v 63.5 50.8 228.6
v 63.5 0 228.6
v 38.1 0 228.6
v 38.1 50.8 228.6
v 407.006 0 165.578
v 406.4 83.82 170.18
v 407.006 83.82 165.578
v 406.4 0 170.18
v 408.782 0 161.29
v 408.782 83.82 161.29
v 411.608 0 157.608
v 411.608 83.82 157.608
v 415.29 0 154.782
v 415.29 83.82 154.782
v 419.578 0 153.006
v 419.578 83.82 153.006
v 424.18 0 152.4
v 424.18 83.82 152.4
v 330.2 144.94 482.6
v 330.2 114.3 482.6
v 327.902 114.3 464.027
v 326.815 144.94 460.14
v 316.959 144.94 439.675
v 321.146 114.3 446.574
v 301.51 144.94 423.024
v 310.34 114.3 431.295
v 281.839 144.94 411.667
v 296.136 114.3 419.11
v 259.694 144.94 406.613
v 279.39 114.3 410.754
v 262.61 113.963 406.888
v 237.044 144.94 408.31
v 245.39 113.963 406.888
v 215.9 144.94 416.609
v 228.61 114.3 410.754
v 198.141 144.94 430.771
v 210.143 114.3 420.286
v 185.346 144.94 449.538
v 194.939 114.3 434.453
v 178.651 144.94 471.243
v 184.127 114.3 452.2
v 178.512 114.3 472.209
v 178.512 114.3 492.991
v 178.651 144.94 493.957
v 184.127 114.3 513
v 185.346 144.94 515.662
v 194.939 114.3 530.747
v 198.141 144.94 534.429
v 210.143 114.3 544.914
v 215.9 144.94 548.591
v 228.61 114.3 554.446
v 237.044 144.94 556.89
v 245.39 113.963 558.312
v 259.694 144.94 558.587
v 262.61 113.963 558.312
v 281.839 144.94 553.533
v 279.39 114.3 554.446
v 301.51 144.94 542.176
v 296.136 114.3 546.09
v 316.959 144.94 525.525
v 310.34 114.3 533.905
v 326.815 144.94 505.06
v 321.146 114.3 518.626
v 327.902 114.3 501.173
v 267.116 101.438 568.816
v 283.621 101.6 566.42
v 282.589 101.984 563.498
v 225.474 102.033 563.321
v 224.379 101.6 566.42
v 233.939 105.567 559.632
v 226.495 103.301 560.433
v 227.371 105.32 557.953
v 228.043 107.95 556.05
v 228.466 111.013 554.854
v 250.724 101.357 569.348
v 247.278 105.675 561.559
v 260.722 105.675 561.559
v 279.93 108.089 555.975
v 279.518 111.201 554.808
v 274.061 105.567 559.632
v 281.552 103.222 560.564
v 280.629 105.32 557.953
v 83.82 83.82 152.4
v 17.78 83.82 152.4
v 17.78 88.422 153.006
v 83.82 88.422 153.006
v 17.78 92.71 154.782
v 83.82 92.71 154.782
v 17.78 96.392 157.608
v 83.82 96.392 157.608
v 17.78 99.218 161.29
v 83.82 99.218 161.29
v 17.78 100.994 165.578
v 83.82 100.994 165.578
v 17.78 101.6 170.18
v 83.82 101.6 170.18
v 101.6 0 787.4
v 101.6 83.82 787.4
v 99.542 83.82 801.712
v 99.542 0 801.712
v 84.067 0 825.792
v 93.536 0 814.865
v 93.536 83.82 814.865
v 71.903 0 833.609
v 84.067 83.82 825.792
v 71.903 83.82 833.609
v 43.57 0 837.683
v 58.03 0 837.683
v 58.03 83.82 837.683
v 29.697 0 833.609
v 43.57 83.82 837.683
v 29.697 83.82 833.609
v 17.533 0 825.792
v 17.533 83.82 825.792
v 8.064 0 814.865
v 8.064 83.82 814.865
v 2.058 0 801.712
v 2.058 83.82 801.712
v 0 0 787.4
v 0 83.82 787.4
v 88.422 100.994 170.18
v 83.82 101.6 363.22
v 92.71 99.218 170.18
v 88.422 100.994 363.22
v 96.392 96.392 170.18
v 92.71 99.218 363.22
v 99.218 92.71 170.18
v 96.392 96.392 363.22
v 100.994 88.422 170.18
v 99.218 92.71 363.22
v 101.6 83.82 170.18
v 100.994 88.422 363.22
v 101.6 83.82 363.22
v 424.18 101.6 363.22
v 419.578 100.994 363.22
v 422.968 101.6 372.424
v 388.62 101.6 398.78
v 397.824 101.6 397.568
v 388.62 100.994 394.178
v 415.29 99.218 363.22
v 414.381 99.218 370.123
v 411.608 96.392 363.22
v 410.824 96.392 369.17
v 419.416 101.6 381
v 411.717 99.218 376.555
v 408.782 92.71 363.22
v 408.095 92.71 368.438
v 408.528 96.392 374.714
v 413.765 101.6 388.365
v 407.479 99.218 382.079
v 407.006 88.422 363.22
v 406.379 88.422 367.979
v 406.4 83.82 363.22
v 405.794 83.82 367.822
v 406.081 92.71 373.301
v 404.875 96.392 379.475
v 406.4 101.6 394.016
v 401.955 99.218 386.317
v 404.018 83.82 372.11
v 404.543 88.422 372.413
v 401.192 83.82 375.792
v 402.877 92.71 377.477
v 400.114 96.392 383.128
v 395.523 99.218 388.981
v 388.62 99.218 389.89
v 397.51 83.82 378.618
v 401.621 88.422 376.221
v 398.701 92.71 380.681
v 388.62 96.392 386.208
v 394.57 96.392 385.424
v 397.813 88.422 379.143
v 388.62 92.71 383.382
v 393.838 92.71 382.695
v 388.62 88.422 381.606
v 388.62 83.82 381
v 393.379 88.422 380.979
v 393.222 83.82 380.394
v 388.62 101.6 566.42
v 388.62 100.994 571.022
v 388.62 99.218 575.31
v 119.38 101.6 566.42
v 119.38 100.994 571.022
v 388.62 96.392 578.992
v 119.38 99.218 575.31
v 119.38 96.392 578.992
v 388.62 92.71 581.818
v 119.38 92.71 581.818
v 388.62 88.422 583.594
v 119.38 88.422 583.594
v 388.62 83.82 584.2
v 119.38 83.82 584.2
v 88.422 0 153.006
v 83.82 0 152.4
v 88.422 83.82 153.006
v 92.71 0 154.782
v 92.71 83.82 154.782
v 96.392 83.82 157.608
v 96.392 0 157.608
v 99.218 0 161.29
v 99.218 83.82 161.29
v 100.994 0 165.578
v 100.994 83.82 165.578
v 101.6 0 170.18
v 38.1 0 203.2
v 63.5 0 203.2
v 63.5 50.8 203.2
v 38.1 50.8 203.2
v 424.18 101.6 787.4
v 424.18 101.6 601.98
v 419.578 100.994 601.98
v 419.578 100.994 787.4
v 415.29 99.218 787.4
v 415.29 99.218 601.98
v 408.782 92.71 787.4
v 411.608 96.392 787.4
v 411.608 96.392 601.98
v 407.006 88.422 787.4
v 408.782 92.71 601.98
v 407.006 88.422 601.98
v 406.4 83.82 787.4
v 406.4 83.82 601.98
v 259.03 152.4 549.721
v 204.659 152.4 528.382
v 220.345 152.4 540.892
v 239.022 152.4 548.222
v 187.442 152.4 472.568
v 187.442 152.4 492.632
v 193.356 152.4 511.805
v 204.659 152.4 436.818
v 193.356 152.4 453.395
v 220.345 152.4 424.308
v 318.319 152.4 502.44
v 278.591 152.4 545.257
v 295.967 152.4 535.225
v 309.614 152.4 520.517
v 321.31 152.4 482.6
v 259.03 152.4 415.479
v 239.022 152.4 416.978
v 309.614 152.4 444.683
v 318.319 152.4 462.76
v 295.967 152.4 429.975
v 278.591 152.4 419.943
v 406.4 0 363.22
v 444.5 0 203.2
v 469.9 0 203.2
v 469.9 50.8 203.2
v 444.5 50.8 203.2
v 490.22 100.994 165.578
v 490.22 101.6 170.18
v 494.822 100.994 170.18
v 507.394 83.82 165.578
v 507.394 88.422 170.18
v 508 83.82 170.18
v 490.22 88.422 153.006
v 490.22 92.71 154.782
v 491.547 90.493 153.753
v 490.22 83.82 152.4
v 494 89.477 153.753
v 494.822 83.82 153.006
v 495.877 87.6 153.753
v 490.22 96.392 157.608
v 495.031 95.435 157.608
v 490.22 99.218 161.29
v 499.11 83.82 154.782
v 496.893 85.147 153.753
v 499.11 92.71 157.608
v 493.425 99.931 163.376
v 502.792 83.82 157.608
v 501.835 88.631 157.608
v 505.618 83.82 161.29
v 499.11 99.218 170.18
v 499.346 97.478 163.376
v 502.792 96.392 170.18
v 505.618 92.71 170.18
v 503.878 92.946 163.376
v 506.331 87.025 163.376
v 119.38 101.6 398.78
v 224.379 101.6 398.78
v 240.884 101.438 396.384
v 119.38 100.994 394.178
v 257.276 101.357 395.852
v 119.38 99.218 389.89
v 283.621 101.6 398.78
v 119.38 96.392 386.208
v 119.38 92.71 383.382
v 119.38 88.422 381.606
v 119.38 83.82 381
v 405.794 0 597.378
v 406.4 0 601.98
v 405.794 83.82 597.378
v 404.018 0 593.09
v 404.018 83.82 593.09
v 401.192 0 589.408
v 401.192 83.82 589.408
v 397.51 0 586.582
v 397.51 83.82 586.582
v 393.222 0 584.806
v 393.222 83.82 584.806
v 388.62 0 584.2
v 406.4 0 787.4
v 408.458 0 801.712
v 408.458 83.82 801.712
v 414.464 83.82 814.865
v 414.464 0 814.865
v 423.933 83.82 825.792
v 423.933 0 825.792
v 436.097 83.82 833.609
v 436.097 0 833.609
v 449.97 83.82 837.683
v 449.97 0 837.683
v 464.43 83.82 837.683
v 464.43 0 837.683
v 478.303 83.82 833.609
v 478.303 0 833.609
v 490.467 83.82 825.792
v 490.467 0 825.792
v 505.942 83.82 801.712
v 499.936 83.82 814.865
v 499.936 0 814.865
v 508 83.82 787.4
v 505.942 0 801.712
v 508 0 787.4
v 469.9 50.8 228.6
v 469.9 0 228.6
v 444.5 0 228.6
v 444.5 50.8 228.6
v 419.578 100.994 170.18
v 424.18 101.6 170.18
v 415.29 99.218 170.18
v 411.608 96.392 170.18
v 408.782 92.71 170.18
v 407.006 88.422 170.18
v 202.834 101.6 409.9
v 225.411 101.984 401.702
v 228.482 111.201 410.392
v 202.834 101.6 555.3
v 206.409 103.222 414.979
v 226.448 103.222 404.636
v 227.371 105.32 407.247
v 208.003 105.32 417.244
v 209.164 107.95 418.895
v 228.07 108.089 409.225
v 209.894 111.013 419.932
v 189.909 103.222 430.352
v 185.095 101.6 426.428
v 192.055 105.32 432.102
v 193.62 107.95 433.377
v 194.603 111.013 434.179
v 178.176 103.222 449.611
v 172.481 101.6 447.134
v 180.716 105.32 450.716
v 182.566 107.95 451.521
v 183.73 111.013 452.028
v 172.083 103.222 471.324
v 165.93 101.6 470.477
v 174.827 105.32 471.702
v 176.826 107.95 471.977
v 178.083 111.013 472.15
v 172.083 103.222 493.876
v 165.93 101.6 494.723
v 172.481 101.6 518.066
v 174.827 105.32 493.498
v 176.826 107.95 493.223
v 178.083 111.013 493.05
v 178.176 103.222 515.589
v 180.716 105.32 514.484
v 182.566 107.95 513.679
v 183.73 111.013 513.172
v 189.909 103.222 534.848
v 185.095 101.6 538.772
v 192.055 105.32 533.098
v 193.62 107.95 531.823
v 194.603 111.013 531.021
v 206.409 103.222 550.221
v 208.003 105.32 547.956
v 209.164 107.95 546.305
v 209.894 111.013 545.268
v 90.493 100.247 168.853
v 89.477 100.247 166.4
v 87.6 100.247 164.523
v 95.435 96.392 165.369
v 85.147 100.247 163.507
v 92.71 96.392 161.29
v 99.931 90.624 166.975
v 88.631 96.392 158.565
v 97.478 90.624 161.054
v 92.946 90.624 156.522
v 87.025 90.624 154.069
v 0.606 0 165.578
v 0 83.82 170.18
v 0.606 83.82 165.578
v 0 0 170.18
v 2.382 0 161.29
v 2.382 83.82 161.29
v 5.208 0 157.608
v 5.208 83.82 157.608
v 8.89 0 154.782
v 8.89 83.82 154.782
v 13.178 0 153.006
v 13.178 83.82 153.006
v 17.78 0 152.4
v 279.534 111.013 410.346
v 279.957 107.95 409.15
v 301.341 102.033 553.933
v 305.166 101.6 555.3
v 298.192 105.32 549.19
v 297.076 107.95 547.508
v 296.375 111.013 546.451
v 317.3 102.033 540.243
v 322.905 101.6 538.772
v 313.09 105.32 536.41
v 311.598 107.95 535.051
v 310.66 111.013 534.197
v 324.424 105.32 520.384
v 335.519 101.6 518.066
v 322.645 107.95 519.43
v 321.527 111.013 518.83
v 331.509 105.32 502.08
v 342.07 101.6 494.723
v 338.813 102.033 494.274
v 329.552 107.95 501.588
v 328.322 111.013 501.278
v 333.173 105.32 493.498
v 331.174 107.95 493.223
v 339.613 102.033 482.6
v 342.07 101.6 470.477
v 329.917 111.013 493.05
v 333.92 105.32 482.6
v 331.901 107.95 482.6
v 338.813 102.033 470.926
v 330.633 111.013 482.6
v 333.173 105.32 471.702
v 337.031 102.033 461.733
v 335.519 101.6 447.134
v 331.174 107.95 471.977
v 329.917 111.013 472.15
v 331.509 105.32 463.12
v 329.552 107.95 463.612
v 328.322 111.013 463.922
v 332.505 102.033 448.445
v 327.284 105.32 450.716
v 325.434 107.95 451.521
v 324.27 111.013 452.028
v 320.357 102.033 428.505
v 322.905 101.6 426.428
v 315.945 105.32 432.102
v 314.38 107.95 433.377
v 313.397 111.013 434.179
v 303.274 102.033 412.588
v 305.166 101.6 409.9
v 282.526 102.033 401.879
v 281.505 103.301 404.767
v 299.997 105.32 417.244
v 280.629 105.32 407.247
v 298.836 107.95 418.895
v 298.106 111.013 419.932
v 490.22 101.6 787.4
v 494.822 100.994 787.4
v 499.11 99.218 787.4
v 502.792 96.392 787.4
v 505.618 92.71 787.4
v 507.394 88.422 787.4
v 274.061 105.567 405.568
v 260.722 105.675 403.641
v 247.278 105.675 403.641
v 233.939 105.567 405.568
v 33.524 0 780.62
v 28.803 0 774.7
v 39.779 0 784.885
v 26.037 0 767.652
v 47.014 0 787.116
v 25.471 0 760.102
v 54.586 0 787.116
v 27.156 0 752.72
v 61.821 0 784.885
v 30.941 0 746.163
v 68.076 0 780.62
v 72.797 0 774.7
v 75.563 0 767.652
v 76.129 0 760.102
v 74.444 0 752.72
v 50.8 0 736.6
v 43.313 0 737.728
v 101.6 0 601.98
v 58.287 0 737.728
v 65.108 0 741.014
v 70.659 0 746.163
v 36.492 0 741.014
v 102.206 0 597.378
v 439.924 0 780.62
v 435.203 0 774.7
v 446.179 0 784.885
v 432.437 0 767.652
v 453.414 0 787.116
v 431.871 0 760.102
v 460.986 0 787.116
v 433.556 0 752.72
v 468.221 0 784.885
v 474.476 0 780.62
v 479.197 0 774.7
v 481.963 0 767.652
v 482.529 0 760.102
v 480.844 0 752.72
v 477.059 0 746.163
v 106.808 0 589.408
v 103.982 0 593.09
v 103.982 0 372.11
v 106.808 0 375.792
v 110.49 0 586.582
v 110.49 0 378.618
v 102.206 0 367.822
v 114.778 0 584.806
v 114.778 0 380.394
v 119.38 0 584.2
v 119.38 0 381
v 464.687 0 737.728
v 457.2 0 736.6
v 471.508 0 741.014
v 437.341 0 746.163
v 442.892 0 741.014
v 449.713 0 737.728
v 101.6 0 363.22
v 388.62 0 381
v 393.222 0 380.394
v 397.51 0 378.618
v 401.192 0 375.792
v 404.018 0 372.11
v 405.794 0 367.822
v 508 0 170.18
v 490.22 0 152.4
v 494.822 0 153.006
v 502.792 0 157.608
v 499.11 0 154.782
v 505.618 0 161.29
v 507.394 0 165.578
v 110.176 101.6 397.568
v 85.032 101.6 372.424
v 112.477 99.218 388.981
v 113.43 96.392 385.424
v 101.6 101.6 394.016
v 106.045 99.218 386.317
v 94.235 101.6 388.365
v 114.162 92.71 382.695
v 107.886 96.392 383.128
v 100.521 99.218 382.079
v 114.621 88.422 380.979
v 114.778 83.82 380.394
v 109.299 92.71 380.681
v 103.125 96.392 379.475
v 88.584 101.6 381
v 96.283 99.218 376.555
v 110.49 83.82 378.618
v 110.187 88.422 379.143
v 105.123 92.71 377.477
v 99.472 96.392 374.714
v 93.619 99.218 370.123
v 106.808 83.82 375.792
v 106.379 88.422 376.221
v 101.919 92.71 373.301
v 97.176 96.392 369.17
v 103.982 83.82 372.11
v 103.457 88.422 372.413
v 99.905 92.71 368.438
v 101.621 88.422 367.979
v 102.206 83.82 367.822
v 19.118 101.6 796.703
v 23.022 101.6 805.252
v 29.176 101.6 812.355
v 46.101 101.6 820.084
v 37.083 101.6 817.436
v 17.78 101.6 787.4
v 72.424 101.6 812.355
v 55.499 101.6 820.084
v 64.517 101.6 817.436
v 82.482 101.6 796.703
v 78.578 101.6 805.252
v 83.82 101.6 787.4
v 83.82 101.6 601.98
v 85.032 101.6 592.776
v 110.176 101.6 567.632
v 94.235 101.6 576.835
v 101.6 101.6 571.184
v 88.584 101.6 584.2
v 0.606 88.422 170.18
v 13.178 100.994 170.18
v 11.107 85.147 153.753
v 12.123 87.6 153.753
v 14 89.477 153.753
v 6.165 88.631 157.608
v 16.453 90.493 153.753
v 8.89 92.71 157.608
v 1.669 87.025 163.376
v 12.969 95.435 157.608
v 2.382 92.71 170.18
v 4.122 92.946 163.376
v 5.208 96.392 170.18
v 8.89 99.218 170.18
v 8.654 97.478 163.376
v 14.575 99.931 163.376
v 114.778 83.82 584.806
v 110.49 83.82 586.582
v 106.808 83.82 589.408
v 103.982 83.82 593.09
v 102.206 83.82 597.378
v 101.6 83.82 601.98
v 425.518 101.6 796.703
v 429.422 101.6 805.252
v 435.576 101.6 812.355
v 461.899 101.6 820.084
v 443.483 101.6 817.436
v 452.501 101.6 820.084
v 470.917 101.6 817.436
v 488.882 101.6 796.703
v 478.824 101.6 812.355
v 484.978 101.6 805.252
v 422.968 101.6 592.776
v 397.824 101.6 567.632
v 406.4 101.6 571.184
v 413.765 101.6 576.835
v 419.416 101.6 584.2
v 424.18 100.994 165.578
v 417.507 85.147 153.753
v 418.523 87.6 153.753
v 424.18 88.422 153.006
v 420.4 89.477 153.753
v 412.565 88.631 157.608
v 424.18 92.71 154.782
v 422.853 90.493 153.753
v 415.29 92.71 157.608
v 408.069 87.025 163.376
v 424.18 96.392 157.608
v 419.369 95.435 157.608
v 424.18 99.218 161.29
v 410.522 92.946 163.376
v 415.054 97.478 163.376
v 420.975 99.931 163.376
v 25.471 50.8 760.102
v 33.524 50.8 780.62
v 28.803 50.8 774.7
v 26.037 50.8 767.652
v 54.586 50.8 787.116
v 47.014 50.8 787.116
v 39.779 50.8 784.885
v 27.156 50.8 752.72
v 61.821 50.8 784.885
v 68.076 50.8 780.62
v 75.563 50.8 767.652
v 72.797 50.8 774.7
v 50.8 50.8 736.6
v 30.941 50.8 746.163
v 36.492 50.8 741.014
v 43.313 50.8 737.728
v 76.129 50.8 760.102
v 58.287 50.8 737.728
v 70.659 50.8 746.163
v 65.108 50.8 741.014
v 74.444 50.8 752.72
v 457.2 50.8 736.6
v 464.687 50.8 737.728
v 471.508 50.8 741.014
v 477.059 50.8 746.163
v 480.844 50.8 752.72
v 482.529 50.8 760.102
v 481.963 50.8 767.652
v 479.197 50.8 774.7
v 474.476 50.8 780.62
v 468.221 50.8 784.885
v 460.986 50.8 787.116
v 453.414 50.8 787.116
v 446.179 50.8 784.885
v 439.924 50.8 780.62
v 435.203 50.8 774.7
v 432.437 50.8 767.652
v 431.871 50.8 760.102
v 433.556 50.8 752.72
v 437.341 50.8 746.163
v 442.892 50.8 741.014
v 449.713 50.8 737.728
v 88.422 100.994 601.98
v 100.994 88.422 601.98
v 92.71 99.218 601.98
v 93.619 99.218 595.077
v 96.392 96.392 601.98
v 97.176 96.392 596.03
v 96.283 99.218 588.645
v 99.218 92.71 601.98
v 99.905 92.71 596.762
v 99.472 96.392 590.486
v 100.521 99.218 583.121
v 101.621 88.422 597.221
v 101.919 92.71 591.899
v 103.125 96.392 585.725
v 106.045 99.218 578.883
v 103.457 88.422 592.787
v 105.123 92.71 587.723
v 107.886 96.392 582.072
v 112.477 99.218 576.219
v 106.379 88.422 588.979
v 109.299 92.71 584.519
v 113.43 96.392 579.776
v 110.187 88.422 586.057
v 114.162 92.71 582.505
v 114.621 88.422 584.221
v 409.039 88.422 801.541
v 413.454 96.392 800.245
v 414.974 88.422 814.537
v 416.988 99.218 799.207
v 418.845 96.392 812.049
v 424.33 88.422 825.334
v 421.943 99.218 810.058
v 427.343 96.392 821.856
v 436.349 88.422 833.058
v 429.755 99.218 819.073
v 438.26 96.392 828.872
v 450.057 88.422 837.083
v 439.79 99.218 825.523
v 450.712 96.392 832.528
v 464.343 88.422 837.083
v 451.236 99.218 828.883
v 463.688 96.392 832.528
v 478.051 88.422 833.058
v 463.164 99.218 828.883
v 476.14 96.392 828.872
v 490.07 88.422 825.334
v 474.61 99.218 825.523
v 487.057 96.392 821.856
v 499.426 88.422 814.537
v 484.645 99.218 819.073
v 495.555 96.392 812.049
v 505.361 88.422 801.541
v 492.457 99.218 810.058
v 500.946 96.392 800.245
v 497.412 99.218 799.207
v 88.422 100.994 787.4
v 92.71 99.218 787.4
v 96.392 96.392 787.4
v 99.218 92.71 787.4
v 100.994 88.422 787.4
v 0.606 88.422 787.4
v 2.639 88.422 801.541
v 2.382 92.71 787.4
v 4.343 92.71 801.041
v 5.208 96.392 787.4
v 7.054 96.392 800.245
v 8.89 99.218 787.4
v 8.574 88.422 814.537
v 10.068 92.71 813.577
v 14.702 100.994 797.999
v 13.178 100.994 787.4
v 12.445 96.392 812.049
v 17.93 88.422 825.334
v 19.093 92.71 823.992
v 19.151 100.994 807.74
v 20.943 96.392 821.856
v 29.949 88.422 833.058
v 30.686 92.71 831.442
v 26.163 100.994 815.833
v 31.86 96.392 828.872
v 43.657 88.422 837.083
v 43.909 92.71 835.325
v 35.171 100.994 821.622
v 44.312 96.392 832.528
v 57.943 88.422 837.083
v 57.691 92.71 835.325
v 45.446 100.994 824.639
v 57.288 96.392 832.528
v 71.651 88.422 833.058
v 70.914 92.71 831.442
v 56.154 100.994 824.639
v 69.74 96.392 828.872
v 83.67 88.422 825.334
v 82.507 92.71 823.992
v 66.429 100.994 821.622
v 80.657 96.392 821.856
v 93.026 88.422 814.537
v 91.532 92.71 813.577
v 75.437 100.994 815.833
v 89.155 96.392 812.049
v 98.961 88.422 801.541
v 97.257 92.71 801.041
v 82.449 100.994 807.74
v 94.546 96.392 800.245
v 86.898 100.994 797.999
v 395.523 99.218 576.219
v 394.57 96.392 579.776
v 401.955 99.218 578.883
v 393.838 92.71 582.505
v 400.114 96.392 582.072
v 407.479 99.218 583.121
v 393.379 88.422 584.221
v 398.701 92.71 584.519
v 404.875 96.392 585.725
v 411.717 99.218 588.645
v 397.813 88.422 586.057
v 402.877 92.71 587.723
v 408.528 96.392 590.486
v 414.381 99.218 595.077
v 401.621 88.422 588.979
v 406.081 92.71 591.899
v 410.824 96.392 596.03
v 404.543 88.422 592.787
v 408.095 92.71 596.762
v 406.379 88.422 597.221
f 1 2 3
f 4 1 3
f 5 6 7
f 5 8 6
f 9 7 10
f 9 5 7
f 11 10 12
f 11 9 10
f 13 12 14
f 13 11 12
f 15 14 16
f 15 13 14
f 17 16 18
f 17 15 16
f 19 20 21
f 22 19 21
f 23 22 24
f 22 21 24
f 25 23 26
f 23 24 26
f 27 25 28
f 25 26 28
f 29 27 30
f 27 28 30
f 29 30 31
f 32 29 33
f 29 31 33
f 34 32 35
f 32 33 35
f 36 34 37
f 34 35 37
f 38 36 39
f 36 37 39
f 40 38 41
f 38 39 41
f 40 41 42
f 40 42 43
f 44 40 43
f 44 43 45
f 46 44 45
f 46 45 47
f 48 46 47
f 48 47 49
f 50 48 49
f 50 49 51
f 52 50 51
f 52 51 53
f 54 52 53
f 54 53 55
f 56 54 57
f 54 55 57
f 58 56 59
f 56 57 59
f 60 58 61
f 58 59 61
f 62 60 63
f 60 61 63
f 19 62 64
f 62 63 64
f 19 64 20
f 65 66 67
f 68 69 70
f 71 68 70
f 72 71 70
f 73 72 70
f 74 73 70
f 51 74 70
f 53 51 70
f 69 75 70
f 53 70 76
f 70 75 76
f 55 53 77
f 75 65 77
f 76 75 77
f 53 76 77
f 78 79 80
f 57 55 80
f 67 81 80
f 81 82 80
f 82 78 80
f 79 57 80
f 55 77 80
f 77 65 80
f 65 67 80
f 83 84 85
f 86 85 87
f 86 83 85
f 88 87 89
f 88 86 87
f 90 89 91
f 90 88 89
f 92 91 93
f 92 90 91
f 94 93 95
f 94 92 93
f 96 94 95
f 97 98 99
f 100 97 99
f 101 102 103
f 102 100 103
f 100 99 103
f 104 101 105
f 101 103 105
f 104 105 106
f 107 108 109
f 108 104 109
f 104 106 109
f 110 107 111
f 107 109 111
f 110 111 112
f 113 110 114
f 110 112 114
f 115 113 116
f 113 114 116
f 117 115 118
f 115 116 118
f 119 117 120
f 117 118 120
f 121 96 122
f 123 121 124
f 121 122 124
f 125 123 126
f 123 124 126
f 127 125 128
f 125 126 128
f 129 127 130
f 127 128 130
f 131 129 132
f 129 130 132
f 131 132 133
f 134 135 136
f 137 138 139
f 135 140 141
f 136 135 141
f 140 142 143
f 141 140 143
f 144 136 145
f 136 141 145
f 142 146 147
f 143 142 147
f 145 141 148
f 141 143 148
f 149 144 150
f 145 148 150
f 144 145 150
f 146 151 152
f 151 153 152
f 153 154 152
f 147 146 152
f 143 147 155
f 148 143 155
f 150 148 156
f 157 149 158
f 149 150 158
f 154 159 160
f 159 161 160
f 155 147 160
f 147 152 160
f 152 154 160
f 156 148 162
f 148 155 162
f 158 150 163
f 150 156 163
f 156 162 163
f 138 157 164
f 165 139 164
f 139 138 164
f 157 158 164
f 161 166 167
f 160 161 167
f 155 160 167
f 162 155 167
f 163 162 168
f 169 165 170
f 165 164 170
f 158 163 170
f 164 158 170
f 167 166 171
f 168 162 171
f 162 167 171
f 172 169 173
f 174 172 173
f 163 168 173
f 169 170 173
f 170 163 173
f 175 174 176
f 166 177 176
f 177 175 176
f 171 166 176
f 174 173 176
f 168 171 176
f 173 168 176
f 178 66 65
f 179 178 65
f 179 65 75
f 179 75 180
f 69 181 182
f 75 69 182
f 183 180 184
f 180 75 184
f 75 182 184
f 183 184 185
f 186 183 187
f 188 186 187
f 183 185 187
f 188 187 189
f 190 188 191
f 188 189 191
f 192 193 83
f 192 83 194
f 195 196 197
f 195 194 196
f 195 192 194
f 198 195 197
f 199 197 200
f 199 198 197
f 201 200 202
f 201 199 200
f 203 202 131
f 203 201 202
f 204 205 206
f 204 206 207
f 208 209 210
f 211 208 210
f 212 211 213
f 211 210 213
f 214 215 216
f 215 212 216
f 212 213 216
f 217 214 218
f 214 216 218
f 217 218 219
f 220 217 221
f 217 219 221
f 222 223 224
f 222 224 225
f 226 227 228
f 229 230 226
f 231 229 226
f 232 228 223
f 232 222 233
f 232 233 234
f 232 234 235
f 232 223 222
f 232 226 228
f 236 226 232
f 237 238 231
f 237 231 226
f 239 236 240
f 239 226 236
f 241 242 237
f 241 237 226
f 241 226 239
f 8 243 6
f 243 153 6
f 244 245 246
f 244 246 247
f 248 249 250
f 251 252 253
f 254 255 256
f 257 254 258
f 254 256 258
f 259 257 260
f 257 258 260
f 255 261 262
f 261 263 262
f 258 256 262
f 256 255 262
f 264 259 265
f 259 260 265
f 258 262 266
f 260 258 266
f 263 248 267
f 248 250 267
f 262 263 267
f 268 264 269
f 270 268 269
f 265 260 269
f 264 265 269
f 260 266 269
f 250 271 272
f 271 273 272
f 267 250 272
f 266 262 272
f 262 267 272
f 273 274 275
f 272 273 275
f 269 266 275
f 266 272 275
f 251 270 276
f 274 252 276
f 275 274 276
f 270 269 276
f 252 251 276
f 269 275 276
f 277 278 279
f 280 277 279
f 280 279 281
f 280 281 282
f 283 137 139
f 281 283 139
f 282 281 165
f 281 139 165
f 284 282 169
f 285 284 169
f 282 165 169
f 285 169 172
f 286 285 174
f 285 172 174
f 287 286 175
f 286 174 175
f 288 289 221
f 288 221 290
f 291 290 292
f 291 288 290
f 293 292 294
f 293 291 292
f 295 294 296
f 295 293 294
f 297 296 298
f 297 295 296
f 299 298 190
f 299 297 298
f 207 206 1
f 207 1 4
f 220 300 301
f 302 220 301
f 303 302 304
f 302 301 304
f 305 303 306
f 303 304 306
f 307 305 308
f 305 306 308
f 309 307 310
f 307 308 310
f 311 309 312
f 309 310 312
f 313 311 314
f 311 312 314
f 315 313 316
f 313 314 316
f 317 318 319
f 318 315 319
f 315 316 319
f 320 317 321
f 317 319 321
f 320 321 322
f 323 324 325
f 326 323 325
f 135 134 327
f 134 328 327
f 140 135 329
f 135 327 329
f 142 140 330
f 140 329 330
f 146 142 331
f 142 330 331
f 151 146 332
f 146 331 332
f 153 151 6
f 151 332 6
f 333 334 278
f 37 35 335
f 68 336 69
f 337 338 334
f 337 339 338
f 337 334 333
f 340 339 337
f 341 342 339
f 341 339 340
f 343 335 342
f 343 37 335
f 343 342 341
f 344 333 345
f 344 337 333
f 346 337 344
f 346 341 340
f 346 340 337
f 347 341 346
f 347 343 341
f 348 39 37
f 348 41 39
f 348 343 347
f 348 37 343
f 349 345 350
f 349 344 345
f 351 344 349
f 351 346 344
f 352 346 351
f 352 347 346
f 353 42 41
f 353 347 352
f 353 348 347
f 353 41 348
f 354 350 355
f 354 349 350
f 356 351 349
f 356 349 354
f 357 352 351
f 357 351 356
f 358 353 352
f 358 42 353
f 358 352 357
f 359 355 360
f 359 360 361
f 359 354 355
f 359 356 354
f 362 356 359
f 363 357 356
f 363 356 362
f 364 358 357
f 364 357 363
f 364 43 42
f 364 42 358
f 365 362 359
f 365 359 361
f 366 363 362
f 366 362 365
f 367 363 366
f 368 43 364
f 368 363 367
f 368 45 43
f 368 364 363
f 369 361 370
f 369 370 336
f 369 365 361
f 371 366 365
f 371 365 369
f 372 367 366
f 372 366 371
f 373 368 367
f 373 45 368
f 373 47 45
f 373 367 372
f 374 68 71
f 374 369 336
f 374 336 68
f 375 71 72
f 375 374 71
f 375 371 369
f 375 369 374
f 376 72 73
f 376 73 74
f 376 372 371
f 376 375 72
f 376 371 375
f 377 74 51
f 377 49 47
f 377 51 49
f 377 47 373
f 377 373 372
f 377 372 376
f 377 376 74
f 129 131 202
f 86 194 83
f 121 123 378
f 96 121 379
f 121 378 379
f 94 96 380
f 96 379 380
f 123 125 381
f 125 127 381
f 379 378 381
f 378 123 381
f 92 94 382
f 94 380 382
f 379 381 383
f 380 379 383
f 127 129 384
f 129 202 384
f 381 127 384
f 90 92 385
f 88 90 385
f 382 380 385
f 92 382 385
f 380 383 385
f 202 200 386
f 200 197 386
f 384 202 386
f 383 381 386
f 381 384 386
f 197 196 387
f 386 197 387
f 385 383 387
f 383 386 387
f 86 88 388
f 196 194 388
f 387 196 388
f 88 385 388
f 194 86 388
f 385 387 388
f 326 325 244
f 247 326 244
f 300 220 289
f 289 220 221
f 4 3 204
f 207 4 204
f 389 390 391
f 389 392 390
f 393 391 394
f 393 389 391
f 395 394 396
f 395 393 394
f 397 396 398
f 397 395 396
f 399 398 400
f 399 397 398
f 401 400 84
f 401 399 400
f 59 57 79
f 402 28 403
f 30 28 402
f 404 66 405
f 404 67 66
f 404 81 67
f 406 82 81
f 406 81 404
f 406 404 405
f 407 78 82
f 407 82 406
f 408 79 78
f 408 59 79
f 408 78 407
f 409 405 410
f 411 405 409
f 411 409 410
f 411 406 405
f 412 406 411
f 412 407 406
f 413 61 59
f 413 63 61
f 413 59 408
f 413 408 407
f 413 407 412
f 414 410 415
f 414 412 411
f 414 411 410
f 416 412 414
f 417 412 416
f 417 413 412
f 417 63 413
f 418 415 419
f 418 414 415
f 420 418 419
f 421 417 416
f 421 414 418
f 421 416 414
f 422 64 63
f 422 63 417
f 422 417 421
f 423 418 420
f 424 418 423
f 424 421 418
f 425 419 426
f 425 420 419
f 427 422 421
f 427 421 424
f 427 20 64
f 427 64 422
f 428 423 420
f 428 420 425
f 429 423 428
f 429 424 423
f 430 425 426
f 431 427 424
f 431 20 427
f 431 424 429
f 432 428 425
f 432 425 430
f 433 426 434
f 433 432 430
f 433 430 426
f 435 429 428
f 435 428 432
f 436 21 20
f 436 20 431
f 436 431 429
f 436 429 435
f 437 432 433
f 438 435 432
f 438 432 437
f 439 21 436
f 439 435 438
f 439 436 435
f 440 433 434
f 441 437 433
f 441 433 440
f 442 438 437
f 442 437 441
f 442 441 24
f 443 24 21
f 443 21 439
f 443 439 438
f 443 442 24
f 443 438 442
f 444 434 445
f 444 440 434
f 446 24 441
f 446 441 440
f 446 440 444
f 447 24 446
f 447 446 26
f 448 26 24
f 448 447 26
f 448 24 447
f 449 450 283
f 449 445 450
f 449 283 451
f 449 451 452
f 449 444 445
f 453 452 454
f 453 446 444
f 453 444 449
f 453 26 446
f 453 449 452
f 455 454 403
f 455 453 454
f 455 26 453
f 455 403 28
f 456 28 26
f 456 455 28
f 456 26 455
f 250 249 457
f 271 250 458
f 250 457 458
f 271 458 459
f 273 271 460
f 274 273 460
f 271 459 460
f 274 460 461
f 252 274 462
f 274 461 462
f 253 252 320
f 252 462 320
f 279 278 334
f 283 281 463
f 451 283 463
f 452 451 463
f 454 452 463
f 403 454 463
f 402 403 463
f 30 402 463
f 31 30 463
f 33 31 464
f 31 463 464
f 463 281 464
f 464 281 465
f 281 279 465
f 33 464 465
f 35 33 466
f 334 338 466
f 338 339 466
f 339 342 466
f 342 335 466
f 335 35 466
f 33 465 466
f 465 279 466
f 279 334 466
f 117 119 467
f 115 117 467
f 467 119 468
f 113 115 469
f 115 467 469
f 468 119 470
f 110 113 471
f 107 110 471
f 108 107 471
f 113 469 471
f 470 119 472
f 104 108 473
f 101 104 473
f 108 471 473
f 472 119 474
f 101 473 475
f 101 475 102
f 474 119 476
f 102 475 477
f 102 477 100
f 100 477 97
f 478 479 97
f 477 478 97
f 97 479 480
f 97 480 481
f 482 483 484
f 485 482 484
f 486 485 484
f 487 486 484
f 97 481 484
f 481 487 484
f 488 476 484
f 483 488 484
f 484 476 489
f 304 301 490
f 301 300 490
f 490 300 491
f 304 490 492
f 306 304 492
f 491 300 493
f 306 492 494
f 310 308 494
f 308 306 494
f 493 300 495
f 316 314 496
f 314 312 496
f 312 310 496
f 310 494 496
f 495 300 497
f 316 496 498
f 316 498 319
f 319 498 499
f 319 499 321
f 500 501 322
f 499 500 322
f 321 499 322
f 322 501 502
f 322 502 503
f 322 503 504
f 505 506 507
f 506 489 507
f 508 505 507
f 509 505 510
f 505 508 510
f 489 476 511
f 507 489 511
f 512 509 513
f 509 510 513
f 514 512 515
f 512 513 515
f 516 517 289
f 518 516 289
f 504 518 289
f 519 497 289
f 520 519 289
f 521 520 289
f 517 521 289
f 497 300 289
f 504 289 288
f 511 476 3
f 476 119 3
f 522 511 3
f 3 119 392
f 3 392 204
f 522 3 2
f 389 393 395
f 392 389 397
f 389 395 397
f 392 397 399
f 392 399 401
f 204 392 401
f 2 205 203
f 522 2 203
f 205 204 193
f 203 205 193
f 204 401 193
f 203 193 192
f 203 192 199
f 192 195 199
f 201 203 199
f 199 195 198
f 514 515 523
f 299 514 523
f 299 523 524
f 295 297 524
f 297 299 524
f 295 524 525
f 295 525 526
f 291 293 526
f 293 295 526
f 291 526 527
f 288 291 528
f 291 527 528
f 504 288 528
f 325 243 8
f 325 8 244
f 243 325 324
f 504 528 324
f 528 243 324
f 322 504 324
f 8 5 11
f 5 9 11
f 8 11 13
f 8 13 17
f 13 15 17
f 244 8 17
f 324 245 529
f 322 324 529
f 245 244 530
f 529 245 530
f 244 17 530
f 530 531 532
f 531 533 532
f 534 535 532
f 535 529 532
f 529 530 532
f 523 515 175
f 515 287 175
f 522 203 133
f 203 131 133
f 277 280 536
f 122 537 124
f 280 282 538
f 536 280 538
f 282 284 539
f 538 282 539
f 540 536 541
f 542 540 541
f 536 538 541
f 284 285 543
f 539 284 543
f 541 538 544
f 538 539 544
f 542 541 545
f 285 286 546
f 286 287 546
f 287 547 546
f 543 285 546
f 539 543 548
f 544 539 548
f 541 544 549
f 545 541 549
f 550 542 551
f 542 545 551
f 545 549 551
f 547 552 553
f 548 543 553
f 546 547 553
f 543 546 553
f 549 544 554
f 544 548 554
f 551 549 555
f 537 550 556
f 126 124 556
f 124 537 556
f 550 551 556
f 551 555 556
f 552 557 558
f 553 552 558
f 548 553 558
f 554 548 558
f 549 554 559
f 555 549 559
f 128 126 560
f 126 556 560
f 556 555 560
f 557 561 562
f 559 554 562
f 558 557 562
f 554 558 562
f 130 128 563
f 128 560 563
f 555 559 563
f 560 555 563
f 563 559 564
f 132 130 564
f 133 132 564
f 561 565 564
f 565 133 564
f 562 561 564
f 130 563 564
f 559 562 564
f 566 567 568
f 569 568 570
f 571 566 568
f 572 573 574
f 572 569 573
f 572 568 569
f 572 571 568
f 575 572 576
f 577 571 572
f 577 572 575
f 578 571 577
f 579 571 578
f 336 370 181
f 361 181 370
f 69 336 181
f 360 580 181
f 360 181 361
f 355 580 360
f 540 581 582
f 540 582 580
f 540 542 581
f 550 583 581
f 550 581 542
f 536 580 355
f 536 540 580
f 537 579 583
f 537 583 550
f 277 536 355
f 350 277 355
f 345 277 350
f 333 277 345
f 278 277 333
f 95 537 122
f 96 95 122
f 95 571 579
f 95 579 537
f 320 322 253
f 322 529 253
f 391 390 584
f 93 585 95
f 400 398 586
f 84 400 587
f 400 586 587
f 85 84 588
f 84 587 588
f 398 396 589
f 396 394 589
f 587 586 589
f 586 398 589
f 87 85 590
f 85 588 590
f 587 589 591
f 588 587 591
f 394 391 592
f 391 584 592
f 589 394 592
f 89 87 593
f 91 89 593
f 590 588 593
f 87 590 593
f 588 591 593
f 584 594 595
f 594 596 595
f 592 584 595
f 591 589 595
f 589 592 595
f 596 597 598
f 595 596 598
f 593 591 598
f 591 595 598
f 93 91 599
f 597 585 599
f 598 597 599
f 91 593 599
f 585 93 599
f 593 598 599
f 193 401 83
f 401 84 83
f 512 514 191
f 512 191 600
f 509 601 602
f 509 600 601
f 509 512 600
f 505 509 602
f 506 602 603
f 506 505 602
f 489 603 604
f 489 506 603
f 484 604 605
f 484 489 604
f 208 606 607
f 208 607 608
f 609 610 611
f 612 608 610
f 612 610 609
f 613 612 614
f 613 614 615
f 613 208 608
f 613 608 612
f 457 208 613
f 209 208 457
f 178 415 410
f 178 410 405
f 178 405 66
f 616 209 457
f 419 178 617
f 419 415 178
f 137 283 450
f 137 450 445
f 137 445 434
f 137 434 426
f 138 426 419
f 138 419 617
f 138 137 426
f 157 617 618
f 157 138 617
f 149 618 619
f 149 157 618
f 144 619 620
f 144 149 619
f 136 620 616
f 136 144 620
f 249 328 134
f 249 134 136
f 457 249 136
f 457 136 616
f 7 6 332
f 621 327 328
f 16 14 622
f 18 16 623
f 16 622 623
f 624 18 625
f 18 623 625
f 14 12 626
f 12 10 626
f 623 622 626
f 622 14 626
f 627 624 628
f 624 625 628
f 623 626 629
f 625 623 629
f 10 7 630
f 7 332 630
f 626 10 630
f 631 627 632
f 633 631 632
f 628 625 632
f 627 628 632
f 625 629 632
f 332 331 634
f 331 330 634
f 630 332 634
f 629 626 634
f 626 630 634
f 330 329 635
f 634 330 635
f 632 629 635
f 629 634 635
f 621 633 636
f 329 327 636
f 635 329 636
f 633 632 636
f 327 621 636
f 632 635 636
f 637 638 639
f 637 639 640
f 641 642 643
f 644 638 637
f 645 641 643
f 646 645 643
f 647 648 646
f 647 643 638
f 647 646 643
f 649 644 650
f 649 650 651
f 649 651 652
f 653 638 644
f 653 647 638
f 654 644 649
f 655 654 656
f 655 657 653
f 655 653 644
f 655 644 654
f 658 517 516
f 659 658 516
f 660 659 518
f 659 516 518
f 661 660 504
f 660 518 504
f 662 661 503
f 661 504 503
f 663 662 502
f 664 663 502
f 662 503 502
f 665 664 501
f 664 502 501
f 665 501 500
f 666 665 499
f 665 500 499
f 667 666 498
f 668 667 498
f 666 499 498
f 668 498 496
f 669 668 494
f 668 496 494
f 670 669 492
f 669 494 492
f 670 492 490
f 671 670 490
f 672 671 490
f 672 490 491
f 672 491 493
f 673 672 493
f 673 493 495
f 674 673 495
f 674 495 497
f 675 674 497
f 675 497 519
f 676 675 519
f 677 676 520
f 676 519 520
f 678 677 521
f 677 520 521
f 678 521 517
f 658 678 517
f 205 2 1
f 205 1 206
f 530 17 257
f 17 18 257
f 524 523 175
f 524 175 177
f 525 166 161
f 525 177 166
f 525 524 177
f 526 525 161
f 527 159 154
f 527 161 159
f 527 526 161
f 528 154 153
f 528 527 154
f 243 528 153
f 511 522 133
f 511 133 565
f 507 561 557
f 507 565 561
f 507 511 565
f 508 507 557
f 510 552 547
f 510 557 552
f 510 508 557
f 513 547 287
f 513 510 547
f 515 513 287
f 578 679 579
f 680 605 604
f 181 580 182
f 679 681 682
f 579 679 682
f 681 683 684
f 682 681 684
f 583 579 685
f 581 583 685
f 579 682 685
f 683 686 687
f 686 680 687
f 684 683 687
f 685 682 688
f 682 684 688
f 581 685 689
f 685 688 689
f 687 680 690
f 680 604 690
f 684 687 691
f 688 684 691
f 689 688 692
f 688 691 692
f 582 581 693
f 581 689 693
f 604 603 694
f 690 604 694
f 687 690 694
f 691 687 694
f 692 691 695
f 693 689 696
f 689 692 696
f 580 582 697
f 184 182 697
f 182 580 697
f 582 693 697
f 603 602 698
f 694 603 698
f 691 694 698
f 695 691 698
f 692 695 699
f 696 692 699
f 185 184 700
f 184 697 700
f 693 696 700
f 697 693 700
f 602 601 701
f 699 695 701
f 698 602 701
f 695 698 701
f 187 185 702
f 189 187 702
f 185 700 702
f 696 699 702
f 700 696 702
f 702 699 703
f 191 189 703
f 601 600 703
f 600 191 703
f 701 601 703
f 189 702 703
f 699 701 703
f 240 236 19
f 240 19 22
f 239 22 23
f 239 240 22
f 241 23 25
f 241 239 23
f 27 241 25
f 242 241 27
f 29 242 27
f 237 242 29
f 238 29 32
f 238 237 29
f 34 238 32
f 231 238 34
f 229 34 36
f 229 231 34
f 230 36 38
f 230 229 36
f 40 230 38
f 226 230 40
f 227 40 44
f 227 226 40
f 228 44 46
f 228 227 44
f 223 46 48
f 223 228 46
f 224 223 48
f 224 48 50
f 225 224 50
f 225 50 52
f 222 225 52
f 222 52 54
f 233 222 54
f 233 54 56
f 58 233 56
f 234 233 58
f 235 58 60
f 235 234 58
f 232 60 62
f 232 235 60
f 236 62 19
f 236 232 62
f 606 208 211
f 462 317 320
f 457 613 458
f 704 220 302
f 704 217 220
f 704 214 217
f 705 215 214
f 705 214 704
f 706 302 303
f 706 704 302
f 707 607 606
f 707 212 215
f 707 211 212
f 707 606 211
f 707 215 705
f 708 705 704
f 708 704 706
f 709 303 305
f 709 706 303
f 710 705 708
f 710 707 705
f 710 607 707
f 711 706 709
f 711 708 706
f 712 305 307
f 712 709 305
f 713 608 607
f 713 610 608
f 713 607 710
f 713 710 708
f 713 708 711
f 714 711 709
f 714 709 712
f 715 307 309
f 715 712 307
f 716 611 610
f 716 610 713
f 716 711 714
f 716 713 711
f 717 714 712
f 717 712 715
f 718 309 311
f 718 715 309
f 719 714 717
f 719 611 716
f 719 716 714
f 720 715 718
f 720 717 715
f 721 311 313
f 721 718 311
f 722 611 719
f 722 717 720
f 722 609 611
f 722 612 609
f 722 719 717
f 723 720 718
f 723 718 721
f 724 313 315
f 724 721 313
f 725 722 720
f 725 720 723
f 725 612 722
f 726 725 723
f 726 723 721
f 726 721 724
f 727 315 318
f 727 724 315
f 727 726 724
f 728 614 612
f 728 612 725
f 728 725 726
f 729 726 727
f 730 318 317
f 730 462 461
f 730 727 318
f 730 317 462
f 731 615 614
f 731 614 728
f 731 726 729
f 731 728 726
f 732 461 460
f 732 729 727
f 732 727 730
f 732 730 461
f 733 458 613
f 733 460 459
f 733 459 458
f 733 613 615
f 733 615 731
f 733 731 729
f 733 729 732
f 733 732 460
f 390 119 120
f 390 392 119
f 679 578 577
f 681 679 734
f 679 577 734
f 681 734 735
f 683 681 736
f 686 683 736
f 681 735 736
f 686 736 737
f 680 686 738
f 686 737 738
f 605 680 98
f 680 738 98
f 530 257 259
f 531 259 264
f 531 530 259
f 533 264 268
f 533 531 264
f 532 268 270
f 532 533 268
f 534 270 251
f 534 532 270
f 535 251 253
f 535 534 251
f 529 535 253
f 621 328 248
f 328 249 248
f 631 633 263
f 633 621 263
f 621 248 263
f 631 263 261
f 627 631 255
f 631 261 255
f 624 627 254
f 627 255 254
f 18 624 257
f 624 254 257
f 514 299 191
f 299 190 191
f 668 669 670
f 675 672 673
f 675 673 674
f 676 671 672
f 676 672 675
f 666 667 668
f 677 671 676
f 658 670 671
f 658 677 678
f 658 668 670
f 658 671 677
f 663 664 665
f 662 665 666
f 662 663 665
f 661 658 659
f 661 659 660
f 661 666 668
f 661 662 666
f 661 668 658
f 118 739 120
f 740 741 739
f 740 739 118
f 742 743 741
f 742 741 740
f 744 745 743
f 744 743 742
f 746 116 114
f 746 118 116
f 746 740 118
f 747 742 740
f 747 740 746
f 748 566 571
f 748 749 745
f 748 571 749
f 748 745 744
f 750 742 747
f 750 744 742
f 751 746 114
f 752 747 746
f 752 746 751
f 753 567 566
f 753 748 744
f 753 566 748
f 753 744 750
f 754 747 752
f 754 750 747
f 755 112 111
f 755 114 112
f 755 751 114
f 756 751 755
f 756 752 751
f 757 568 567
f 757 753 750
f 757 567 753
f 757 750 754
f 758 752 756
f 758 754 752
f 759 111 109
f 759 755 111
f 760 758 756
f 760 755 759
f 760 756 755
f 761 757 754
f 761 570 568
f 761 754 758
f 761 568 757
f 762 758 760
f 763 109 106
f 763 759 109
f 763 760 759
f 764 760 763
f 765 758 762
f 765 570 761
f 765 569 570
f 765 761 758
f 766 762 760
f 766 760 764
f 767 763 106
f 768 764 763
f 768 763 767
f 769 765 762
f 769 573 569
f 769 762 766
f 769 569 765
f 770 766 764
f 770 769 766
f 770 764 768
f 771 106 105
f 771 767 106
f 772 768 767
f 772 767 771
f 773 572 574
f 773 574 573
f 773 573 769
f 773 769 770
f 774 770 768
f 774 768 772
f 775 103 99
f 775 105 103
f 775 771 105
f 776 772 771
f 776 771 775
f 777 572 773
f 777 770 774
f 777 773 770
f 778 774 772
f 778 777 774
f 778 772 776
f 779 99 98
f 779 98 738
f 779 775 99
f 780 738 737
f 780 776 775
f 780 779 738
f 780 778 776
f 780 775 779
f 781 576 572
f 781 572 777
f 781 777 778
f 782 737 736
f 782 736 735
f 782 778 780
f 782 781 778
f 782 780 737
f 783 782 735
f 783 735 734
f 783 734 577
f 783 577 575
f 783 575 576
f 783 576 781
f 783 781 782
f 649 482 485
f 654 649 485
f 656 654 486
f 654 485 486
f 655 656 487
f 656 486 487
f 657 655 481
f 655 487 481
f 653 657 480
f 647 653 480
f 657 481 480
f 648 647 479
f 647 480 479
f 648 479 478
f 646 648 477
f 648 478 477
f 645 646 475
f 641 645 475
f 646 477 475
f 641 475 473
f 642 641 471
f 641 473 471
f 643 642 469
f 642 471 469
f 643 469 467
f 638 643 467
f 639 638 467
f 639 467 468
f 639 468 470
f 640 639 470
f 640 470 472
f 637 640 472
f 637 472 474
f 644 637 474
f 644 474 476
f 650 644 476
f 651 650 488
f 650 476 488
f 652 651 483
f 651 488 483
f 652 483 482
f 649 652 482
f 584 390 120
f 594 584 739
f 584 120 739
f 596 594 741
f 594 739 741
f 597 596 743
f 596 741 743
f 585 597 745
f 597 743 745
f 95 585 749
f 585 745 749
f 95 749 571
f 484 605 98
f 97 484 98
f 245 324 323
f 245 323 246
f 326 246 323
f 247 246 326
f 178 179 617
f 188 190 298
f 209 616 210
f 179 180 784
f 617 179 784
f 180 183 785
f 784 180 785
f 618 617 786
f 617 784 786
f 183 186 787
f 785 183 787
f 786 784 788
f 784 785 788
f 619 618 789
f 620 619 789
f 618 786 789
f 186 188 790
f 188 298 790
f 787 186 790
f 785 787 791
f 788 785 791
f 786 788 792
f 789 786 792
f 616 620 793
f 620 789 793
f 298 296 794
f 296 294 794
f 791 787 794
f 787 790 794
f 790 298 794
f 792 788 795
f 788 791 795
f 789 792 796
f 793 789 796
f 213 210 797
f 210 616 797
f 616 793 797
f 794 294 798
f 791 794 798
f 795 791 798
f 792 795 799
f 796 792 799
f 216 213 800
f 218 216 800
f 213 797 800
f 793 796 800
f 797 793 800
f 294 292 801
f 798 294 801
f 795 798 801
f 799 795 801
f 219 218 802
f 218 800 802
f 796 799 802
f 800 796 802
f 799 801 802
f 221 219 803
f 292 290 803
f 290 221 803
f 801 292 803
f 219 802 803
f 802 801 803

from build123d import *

# Parameters (mm, degrees)
SKETCH2_W               = 508
SKETCH2_H               = 101.6
BOSS_EXTRUDE2_DEPTH     = 965.2
SKETCH3_R               = 25.4
SKETCH3_W               = 25.4
SKETCH3_H               = 25.4
CUT_EXTRUDE1_DEPTH      = 50.8
CUT_EXTRUDE2_DEPTH      = 1096.444019565
CUT_EXTRUDE2_DEPTH_BACK = 1096.444019565
FILLET1_R               = 17.78
FILLET6_R               = 50.8
SKETCH5_R               = 76.2
BOSS_EXTRUDE3_DEPTH     = 50.8
FILLET2_R               = 12.7
CHAMFER1_SIZE           = 7.46
CHAMFER1_SIZE2          = 8.890481801


with BuildPart() as part:
    # Sketch2 → Boss-Extrude2 (new body)
    with BuildSketch(Plane.XY):
        with Locations((254, 50.8)):
            Rectangle(SKETCH2_W, SKETCH2_H)
    extrude(amount=BOSS_EXTRUDE2_DEPTH)

    # Sketch3 → Cut-Extrude1 (cut)
    with BuildSketch(Plane(origin=(0, 0, 0), x_dir=(-1, 0, 0), z_dir=(0, -1, 0))):
        with Locations(Location((-50.8, -762, 0), (0, 0, 90))):
            Circle(SKETCH3_R)
        with Locations(Location((-457.2, -762, 0), (0, 0, 90))):
            Circle(SKETCH3_R)
        with Locations((-457.2, -215.9)):
            Rectangle(SKETCH3_W, SKETCH3_H)
        with Locations((-50.8, -215.9)):
            Rectangle(SKETCH3_W, SKETCH3_H)
    extrude(amount=-CUT_EXTRUDE1_DEPTH, mode=Mode.SUBTRACT)

    # Sketch4 → Cut-Extrude2 (cut, two sides: drawn at the far end of the back side and taken through both)
    with BuildSketch(Plane.XZ.offset(-CUT_EXTRUDE2_DEPTH_BACK)):
        Polygon((101.6, 965.2), (406.4, 965.2), (508, 965.2), (508, 838.2), (406.4, 838.2), (406.4, 584.2), (101.6, 584.2), (101.6, 838.2), (0, 838.2), (0, 965.2), align=None)
        Polygon((101.6, 381), (406.4, 381), (406.4, 152.4), (508, 152.4), (508, 0), (406.4, 0), (101.6, 0), (0, 0), (0, 152.4), (101.6, 152.4), align=None)
    extrude(amount=CUT_EXTRUDE2_DEPTH + CUT_EXTRUDE2_DEPTH_BACK, mode=Mode.SUBTRACT)

    # Fillet1
    fillet1_edges = [part.edges().sort_by_distance(p)[0] for p in [
        (0, 101.6, 495.3),
        (508, 101.6, 495.3),
        (406.4, 101.6, 711.2),
        (406.4, 50.8, 584.2),
        (254, 101.6, 584.2),
        (101.6, 50.8, 584.2),
        (101.6, 101.6, 711.2),
        (457.2, 101.6, 838.2),
        (50.8, 101.6, 838.2),
        (101.6, 50.8, 152.4),
        (101.6, 101.6, 266.7),
        (101.6, 50.8, 381),
        (254, 101.6, 381),
        (406.4, 50.8, 381),
        (406.4, 101.6, 266.7),
        (406.4, 50.8, 152.4),
        (457.2, 101.6, 152.4),
        (0, 50.8, 152.4),
        (50.8, 101.6, 152.4),
        (508, 50.8, 152.4),
    ]]
    fillet(fillet1_edges, radius=FILLET1_R)

    # Fillet6
    # the kernel refuses this fillet: 50.8 mm, written as the material it takes off along each edge
    with BuildSketch(Plane(origin=(50.8, 101.6, 787.4), x_dir=(-1, 0, 0), z_dir=(0, 0, -1))) as fillet6_piece_1:
        with BuildLine():
            CenterArc((33.02, -17.78), 17.78, 0, 90)
            Line((50.8, -17.78), (50.8, 0))
            Line((50.8, 0), (33.02, 0))
        make_face()
    revolve(axis=Axis((50.8, 101.6, 787.4), (0, 1, 0)), revolution_arc=90, mode=Mode.SUBTRACT)
    with BuildSketch(Plane(origin=(50.8, 101.6, 787.4), x_dir=(0, 0, 1), z_dir=(-1, 0, 0))) as fillet6_piece_2:
        with BuildLine():
            CenterArc((33.02, -17.78), 17.78, 0, 90)
            Line((50.8, -17.78), (50.8, 0))
            Line((50.8, 0), (33.02, 0))
        make_face()
    revolve(axis=Axis((50.8, 101.6, 787.4), (0, 1, 0)), revolution_arc=90, mode=Mode.SUBTRACT)
    with BuildSketch(Plane(origin=(457.2, 101.6, 787.4), x_dir=(-1, 0, 0), z_dir=(0, 0, -1))) as fillet6_piece_3:
        with BuildLine():
            CenterArc((33.02, -17.78), 17.78, 0, 90)
            Line((50.8, -17.78), (50.8, 0))
            Line((50.8, 0), (33.02, 0))
        make_face()
    revolve(axis=Axis((457.2, 101.6, 787.4), (0, 1, 0)), revolution_arc=90, mode=Mode.SUBTRACT)
    with BuildSketch(Plane(origin=(457.2, 101.6, 787.4), x_dir=(0, 0, 1), z_dir=(-1, 0, 0))) as fillet6_piece_4:
        with BuildLine():
            CenterArc((33.02, -17.78), 17.78, 0, 90)
            Line((50.8, -17.78), (50.8, 0))
            Line((50.8, 0), (33.02, 0))
        make_face()
    revolve(axis=Axis((457.2, 101.6, 787.4), (0, 1, 0)), revolution_arc=90, mode=Mode.SUBTRACT)
    with BuildSketch(Plane(origin=(508, -127, 838.2), x_dir=(-1, 0, 0), z_dir=(0, 1, 0)), Plane(origin=(406.4, -127, 838.2), x_dir=(0, 0, -1), z_dir=(0, 1, 0))) as fillet6_piece_5:
        with BuildLine():
            CenterArc((FILLET6_R, -FILLET6_R), FILLET6_R, 90, 90)
            Line((0, -FILLET6_R), (0, 0))
            Line((0, 0), (FILLET6_R, 0))
        make_face()
    extrude(amount=228.6, mode=Mode.SUBTRACT)
    with BuildSketch(Plane(origin=(101.6, 101.6, 838.2), x_dir=(-1, 0, 0), z_dir=(0, -1, 0)), Plane(origin=(0, 101.6, 838.2), x_dir=(0, 0, -1), z_dir=(0, -1, 0))) as fillet6_piece_6:
        with BuildLine():
            CenterArc((FILLET6_R, FILLET6_R), FILLET6_R, 180, 90)
            Line((0, FILLET6_R), (0, 0))
            Line((0, 0), (FILLET6_R, 0))
        make_face()
    extrude(amount=228.6, mode=Mode.SUBTRACT)

    # Sketch5 → Boss-Extrude3 (add)
    with BuildSketch(Plane(origin=(0, 101.6, 0), x_dir=(1, 0, 0), z_dir=(0, 1, 0))):
        with Locations((254, -482.6)):
            Circle(SKETCH5_R)
    extrude(amount=BOSS_EXTRUDE3_DEPTH)

    # Fillet2
    fillet2_edges = [part.edges().sort_by_distance(p)[0] for p in [
        (177.8, 101.6, 482.6),
    ]]
    fillet(fillet2_edges, radius=FILLET2_R)

    # Chamfer1
    chamfer1_edges = [part.edges().sort_by_distance(p)[0] for p in [
        (177.8, 152.4, 482.6),
    ]]
    chamfer1_side = [part.faces().sort_by_distance(p)[0] for p in [
        (177.8, 133.057233691, 482.6),
    ]]
    chamfer(chamfer1_edges, length=CHAMFER1_SIZE, length2=CHAMFER1_SIZE2, reference=chamfer1_side[0])


solid = part.part
